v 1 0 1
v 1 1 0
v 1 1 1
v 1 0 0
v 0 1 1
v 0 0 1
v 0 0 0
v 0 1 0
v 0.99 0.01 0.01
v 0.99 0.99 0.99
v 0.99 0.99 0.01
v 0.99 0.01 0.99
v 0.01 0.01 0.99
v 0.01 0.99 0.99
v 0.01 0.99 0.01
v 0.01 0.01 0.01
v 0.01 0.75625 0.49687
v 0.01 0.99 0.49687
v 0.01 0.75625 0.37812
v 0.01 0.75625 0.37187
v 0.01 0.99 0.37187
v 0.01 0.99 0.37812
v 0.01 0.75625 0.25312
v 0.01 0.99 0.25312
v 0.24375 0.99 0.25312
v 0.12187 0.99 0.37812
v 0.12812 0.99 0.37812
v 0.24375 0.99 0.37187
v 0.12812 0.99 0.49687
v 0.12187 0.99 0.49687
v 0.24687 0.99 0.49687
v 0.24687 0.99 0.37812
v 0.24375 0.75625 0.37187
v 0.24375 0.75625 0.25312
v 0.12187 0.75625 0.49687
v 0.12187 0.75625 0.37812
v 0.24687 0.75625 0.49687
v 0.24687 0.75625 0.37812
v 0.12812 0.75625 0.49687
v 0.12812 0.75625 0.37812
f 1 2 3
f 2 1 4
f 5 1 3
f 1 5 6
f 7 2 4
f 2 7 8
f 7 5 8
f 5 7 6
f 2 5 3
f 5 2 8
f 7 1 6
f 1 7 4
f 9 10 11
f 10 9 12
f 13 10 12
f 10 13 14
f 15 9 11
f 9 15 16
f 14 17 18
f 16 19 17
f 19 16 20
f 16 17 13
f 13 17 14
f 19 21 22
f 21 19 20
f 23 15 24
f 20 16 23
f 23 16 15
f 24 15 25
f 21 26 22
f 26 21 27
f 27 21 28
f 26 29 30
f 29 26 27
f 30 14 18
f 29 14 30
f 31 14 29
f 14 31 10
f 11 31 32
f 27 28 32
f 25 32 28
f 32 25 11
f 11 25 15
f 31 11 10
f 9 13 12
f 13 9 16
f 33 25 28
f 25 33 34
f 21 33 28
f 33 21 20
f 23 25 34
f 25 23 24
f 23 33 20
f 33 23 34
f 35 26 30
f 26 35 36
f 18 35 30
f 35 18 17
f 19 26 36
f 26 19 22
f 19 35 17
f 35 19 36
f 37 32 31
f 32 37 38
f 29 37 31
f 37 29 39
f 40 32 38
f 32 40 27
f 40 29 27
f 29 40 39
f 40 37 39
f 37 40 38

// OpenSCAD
translate([0.125, 0.875, 0.3125]) color([0.6314514919010058, 0.19629053512755534, 0.834937066345738]) cube([0.2375, 0.2375, 0.11875], center=true);
translate([0.0625, 0.875, 0.4375]) color([0.4009670746604762, 0.32173203192271393, 0.553082009505837]) cube([0.11875, 0.2375, 0.11875], center=true);
translate([0.1875, 0.875, 0.4375]) color([0.3256937881953724, 0.9109963078438346, 0.13412178984042844]) cube([0.11875, 0.2375, 0.11875], center=true);
color([0.3,0.3,0.3,0.3]) difference() { cube([1,1,1]); translate([0.01,0.01,0.01]) cube([0.98,0.98,0.98]); }
